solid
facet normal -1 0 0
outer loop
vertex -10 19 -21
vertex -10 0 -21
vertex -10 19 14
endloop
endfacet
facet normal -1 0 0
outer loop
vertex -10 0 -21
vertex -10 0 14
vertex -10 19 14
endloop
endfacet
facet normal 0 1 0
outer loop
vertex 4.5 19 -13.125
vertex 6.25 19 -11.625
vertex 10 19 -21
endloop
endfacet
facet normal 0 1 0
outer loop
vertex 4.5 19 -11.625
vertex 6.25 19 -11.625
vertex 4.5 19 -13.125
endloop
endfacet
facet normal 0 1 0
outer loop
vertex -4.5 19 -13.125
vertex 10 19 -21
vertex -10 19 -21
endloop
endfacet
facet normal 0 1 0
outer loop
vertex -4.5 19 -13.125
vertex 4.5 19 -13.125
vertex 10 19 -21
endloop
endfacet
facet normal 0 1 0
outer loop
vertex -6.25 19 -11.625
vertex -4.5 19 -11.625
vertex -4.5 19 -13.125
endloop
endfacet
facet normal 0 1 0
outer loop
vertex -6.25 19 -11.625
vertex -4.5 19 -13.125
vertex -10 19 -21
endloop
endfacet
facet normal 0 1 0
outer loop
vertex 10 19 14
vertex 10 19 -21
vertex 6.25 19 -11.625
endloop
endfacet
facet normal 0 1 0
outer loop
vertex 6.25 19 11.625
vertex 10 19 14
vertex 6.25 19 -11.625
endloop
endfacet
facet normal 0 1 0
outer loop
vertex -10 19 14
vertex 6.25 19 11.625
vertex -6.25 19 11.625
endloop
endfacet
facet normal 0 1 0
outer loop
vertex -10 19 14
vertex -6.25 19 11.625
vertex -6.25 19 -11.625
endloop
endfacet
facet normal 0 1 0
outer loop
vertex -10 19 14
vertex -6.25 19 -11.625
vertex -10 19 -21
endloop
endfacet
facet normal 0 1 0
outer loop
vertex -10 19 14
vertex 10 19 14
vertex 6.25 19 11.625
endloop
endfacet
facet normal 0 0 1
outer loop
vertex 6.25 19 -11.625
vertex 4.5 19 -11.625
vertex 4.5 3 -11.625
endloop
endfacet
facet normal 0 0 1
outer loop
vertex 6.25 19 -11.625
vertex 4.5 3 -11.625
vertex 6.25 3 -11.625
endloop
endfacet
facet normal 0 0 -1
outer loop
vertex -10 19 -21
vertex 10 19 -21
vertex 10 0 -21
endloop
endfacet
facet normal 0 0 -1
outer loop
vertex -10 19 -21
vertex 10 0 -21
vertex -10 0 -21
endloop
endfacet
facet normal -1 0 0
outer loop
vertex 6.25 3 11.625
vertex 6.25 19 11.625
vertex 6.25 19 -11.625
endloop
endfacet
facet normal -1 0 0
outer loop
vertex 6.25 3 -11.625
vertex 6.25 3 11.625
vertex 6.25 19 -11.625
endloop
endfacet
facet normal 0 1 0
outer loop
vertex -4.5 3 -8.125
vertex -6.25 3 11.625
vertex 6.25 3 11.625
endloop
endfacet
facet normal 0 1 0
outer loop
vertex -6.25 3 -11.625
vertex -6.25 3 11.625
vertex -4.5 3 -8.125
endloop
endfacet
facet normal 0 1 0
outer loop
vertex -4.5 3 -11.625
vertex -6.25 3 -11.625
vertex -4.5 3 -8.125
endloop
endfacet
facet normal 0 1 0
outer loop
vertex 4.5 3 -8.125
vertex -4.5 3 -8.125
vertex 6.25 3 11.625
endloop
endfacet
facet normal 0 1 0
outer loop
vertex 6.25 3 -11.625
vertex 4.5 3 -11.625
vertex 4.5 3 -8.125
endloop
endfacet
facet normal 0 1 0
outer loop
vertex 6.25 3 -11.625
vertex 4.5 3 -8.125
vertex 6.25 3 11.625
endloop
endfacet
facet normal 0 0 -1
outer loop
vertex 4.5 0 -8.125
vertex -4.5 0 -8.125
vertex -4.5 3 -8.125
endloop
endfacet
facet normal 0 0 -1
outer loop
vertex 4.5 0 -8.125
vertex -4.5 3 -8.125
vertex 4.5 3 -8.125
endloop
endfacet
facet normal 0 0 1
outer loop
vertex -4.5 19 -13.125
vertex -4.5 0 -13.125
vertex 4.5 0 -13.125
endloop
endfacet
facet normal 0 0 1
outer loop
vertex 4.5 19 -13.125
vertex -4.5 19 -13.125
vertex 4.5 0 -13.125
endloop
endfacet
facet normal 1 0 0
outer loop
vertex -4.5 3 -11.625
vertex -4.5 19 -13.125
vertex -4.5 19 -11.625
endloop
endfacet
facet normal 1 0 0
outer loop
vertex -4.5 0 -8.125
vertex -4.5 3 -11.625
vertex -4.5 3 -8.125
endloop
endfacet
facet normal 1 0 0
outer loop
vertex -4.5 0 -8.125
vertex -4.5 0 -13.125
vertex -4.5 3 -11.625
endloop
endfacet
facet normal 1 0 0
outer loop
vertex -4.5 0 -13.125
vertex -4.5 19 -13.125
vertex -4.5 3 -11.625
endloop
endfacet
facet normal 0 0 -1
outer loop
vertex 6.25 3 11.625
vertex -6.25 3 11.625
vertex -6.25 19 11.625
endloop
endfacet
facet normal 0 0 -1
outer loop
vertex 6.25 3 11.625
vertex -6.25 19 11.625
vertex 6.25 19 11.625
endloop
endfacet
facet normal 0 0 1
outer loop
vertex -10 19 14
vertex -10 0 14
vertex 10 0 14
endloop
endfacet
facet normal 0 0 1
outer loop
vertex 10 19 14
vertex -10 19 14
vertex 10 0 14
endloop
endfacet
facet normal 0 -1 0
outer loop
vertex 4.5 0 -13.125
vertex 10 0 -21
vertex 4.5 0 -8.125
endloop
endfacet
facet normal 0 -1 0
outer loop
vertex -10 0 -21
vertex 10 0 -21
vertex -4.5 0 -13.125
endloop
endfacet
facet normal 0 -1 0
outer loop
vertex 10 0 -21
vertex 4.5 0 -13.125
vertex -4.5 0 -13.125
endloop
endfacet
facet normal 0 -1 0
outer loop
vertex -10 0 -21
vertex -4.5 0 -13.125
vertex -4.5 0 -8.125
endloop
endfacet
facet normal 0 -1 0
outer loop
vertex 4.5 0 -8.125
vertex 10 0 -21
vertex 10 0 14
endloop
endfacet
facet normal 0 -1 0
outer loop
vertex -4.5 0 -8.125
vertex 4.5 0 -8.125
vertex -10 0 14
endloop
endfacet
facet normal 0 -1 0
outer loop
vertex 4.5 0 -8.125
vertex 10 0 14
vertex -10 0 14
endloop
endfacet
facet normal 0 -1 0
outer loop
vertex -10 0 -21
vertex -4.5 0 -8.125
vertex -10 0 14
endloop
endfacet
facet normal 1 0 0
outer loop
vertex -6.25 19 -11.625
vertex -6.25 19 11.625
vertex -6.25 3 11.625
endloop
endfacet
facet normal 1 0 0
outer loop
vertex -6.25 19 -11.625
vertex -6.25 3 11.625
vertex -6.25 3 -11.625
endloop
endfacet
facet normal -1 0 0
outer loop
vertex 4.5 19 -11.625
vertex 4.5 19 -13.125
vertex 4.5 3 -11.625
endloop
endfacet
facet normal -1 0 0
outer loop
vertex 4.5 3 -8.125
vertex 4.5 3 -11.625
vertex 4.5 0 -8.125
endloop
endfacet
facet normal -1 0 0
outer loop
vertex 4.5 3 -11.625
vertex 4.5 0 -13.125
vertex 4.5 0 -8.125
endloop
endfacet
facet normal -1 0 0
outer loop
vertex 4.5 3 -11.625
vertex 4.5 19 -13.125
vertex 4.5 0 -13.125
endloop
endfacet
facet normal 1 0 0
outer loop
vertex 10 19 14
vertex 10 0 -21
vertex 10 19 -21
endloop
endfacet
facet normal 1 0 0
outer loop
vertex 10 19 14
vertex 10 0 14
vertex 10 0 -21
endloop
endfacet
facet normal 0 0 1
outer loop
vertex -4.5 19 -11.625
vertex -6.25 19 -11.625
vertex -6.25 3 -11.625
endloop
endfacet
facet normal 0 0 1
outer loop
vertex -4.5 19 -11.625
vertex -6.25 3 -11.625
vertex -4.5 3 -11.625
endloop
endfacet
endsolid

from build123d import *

# Parameters (mm, degrees)
SKETCH2_W           = 20
SKETCH2_H           = 28
BOSS_EXTRUDE1_DEPTH = 19
SKETCH3_W           = 12.5
SKETCH3_H           = 23.25
CUT_EXTRUDE1_DEPTH  = 16
SKETCH4_W           = 20
SKETCH4_H           = 19
BOSS_EXTRUDE3_DEPTH = 7
SKETCH5_W           = 9
SKETCH5_H           = 5
CUT_EXTRUDE2_DEPTH  = 31.033314835


with BuildPart() as part:
    # Sketch2 → Boss-Extrude1 (new body)
    with BuildSketch(Plane(origin=(0, 0, 0), x_dir=(1, 0, 0), z_dir=(0, 1, 0))):
        Rectangle(SKETCH2_W, SKETCH2_H)
    extrude(amount=BOSS_EXTRUDE1_DEPTH)

    # Sketch3 → Cut-Extrude1 (cut)
    with BuildSketch(Plane(origin=(0, 19, 0), x_dir=(1, 0, 0), z_dir=(0, 1, 0))):
        Rectangle(SKETCH3_W, SKETCH3_H)
    extrude(amount=-CUT_EXTRUDE1_DEPTH, mode=Mode.SUBTRACT)

    # Sketch4 → Boss-Extrude3 (add)
    with BuildSketch(Plane(origin=(0, 0, -14), x_dir=(-1, 0, 0), z_dir=(0, 0, -1))):
        with Locations((0, 9.5)):
            Rectangle(SKETCH4_W, SKETCH4_H)
    extrude(amount=BOSS_EXTRUDE3_DEPTH)

    # Sketch5 → Cut-Extrude2 (cut, through all)
    with BuildSketch(Plane.XZ):
        with Locations((0, -10.625)):
            Rectangle(SKETCH5_W, SKETCH5_H)
    extrude(amount=-CUT_EXTRUDE2_DEPTH, mode=Mode.SUBTRACT)


solid = part.part
